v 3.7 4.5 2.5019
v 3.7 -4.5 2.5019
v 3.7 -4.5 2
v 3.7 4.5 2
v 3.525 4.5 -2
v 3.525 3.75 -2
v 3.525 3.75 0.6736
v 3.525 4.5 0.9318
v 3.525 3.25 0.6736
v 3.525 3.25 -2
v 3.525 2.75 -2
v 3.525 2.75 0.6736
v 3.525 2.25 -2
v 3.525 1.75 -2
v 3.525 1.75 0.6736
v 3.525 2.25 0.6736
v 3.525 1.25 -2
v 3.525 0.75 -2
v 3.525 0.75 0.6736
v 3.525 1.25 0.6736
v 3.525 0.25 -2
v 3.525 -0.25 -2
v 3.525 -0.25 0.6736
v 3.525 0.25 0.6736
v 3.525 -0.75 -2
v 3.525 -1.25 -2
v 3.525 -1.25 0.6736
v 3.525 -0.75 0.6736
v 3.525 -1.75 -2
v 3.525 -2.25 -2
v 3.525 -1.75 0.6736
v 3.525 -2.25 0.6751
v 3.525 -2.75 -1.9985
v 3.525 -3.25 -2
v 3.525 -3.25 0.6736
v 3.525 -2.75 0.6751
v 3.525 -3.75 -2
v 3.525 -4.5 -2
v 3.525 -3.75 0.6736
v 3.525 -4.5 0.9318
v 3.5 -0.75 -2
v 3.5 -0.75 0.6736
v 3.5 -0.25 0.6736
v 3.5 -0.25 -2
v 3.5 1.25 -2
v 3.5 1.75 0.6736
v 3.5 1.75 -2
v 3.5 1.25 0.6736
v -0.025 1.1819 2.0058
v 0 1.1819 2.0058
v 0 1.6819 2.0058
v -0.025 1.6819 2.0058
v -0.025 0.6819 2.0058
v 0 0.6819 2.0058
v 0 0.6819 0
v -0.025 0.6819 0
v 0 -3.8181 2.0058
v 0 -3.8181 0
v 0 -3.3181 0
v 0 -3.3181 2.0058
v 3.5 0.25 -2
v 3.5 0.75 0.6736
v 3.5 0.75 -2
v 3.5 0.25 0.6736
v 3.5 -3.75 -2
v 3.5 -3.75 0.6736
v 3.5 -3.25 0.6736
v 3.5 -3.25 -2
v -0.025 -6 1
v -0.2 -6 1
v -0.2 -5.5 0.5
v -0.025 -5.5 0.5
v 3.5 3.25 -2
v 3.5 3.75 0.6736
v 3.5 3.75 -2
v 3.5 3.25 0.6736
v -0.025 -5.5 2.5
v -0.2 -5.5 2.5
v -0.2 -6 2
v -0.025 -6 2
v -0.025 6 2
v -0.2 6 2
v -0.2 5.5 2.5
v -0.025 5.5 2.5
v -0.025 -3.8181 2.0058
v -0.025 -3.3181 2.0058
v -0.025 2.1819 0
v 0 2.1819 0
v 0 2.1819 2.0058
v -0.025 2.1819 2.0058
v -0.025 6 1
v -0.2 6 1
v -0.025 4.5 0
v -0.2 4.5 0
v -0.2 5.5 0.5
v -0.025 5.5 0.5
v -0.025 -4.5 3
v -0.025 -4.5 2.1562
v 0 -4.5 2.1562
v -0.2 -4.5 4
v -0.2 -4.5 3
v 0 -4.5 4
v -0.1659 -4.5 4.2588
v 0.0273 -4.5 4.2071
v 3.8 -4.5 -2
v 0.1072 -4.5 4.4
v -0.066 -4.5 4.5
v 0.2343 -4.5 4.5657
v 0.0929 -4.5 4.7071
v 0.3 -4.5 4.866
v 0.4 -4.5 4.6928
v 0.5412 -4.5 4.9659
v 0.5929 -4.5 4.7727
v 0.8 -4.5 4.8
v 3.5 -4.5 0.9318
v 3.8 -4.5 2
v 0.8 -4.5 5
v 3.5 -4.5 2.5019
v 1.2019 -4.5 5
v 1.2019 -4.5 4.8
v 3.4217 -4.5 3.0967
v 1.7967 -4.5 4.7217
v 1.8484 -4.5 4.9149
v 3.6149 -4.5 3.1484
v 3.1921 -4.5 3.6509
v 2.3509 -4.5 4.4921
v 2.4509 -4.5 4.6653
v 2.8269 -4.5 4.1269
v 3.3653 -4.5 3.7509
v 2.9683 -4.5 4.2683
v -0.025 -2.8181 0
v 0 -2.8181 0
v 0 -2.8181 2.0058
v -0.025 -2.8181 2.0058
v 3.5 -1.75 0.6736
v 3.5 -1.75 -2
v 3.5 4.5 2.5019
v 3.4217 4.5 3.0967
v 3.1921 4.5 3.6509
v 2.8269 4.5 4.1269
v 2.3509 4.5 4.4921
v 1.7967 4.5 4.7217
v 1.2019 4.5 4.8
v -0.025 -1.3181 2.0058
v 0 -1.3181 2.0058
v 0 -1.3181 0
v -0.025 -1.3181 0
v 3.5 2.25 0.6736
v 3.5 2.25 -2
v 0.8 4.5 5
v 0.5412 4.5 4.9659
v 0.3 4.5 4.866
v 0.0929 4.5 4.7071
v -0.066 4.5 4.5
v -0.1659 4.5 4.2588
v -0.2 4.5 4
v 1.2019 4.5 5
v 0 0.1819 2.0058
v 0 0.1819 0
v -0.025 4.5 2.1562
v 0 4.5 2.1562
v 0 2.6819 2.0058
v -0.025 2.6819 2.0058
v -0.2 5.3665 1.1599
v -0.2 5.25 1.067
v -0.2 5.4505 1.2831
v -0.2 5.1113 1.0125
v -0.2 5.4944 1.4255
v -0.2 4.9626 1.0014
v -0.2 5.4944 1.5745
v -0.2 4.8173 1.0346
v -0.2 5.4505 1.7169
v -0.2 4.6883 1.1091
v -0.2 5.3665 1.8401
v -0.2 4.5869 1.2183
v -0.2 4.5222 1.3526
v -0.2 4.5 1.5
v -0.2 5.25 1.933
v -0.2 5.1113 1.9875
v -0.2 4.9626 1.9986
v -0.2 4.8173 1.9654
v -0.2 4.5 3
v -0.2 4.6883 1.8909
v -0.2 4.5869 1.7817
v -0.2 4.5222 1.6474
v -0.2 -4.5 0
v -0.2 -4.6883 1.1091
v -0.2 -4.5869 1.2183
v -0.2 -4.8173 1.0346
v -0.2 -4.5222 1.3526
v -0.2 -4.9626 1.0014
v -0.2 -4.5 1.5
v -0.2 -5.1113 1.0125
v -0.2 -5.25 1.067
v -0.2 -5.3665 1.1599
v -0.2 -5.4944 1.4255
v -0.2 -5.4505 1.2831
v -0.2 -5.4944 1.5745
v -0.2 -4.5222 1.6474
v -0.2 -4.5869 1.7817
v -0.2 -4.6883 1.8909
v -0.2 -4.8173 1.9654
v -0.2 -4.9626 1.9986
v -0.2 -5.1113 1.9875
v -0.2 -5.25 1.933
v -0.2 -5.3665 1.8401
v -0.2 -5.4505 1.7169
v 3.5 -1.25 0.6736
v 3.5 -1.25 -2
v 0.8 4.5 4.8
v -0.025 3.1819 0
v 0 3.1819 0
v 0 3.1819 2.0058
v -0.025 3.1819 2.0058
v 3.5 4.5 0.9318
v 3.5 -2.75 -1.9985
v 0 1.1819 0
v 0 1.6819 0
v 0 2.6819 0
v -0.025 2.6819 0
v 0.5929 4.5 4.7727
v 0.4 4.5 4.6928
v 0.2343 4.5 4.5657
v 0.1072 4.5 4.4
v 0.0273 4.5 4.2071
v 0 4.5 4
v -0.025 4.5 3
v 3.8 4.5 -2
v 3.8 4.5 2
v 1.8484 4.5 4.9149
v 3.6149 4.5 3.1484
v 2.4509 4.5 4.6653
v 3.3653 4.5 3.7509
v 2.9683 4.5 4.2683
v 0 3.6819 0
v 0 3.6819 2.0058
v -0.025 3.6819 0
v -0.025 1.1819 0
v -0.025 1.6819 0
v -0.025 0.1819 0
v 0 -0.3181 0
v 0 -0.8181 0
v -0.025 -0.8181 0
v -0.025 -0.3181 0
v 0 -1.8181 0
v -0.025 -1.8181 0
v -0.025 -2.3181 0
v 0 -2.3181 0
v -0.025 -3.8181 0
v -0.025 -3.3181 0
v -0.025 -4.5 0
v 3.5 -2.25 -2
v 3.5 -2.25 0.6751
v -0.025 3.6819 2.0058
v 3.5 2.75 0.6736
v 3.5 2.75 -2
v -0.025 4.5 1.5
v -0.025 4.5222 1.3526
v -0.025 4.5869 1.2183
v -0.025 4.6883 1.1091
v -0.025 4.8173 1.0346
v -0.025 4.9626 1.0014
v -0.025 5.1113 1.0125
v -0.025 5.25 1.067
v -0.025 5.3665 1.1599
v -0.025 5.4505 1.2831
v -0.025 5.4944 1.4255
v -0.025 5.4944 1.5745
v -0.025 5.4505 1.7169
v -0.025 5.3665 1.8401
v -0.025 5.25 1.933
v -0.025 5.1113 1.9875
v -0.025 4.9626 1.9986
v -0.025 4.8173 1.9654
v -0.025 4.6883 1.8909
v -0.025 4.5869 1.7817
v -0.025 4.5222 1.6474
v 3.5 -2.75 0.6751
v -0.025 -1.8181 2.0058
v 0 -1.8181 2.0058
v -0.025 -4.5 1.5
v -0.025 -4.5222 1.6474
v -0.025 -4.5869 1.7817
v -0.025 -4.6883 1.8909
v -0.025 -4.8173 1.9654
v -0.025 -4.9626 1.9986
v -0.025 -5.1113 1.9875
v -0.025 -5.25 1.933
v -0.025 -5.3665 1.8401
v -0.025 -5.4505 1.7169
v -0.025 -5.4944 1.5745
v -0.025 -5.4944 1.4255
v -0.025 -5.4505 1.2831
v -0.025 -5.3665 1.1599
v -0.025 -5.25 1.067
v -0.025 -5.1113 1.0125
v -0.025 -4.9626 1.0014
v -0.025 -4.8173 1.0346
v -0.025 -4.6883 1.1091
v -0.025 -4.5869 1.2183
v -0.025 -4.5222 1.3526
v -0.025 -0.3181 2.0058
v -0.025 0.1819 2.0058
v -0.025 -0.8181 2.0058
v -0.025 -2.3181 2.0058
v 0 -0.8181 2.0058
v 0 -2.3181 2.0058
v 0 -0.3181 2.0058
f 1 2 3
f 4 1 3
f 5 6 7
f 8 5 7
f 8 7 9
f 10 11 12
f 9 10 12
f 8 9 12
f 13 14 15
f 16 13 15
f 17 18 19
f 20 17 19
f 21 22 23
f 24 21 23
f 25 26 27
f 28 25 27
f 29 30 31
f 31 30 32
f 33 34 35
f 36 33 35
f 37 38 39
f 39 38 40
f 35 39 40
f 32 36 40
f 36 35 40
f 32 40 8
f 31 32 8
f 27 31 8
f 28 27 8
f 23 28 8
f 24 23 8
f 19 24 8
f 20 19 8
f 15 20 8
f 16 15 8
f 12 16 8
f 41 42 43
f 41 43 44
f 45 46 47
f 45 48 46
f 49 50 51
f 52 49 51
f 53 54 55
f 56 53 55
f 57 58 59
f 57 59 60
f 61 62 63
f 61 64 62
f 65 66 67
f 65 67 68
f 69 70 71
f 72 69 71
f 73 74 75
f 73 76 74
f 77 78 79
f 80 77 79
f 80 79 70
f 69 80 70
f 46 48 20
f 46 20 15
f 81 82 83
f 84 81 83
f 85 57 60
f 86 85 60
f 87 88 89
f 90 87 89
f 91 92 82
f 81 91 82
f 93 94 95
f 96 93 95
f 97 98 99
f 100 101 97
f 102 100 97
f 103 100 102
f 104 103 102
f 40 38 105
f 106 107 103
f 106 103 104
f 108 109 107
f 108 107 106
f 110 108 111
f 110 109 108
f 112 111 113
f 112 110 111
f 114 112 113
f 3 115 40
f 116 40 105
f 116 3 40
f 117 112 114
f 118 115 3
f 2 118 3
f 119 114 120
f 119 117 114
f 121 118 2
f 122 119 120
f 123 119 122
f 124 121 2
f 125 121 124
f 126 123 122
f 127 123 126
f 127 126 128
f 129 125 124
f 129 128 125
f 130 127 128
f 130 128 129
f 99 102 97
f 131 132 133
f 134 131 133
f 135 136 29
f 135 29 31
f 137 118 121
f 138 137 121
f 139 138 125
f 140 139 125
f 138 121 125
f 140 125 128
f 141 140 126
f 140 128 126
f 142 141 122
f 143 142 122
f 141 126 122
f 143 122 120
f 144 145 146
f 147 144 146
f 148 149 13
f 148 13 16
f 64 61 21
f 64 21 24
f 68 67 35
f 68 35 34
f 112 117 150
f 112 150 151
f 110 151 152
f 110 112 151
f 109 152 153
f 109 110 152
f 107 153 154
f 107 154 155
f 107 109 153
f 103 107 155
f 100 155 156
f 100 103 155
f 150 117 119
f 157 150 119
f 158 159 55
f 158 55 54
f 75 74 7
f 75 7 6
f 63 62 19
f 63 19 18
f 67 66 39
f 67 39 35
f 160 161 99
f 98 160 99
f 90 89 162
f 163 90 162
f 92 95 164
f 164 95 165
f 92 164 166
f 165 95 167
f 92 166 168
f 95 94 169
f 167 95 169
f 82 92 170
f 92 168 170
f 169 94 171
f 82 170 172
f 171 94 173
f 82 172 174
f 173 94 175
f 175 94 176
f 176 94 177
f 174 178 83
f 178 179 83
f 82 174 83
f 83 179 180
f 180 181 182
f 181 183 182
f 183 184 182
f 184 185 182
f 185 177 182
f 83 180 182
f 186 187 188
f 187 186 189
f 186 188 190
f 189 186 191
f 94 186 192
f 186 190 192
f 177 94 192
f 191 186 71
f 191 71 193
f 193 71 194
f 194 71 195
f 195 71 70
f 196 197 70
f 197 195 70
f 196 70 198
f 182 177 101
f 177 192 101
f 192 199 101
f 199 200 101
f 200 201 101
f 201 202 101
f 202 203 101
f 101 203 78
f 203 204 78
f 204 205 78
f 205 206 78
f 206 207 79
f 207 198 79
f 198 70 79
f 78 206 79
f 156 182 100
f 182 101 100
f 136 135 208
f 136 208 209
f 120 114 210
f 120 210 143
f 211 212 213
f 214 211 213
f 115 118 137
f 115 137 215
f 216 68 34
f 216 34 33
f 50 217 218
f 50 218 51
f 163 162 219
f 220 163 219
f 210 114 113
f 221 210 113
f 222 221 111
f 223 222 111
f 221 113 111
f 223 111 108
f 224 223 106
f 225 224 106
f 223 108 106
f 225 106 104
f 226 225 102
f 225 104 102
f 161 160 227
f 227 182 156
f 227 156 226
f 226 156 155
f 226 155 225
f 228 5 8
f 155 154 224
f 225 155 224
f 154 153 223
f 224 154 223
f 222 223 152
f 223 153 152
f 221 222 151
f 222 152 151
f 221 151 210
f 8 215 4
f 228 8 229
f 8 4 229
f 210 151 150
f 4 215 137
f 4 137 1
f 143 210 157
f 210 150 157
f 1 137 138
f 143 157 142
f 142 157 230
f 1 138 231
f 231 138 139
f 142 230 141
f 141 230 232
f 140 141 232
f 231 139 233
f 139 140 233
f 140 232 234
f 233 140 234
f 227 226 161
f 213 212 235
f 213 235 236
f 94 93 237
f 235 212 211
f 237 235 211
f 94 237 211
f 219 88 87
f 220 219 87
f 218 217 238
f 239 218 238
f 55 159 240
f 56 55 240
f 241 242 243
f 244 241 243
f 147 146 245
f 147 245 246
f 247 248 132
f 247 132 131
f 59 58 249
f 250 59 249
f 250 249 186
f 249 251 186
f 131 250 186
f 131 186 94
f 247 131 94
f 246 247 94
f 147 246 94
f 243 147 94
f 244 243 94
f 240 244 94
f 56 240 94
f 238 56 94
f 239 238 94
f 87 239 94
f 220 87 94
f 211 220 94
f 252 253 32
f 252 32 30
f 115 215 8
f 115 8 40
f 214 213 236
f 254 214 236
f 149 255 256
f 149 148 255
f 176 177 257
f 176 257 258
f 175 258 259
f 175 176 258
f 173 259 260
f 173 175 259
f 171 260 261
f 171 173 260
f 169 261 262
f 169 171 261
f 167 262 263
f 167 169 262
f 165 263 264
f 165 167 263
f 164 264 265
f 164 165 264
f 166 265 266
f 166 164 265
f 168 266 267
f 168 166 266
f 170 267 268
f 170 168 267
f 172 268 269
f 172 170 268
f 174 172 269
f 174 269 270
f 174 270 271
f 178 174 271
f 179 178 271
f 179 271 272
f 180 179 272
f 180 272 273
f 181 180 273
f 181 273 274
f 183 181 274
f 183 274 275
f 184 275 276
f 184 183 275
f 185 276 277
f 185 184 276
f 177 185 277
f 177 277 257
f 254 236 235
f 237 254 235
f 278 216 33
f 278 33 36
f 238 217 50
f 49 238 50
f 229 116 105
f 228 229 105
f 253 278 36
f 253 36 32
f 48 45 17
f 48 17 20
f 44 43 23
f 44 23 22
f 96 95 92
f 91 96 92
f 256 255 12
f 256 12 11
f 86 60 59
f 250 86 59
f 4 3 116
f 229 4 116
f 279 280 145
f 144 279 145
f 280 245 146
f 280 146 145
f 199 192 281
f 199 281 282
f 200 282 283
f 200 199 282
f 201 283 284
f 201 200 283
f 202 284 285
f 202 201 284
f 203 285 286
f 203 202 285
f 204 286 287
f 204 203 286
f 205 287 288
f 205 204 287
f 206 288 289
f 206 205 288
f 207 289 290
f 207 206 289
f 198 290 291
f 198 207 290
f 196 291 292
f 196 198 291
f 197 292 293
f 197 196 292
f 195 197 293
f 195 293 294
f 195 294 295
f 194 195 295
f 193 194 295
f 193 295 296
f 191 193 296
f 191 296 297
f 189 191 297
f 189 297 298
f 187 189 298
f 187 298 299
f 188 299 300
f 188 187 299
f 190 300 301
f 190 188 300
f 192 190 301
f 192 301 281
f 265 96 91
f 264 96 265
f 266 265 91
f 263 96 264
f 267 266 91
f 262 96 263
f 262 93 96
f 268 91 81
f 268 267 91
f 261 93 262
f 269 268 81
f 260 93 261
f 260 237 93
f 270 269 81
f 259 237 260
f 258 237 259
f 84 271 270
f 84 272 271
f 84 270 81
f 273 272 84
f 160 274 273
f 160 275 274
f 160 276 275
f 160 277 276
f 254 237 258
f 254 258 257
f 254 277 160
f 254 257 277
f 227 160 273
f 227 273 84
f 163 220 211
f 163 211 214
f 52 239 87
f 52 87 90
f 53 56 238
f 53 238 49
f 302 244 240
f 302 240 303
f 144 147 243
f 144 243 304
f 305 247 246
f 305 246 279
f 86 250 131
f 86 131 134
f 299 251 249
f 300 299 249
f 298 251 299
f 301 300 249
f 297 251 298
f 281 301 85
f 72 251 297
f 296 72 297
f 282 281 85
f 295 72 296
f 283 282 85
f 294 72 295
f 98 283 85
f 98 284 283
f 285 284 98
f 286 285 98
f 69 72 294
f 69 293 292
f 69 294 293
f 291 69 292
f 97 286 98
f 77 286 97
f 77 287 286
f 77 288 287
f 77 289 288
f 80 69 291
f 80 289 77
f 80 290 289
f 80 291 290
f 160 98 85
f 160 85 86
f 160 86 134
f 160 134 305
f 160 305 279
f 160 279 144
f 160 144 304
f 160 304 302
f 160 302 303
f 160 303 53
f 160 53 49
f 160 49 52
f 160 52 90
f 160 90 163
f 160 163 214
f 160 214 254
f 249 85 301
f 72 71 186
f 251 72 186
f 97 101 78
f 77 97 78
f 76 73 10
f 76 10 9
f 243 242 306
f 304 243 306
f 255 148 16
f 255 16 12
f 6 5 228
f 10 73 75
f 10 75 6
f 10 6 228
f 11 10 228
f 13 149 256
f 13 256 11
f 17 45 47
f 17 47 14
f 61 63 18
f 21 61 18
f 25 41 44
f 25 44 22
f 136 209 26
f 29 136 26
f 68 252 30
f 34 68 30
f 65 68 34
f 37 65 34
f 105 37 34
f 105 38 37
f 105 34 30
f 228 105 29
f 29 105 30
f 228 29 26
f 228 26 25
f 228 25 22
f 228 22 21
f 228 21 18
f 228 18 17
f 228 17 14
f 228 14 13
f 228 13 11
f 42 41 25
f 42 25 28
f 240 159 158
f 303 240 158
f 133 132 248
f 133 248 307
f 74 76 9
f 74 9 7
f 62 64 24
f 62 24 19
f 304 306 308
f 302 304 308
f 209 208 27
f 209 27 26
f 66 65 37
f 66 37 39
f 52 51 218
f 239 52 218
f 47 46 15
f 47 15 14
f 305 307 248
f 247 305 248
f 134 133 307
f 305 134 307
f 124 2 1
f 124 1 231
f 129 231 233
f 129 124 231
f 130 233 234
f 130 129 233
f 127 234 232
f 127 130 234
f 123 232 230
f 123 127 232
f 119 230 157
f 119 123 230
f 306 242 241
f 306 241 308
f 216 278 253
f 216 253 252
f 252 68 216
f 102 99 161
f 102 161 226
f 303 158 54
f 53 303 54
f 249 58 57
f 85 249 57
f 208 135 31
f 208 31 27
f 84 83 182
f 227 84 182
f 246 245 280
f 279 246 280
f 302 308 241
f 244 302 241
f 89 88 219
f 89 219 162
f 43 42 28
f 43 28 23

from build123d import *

# Parameters (mm, degrees)
PAD_DEPTH       = 4.5
POCKET_DEPTH    = 0.025
POCKET001_DEPTH = 0.025
SKETCH003_R     = 0.5
PAD001_DEPTH    = 0.175


with BuildPart() as part:
    # Sketch → Pad (new body, symmetric)
    with BuildSketch(Plane.XZ):
        with BuildLine():
            Line((0, 0), (0, 4))
            ThreePointArc((0.8, 4.8), (0.234315, 4.565685), (0, 4))
            Line((0.8, 4.8), (1.201873, 4.8))
            ThreePointArc((3.5, 2.501873), (2.826894, 4.126894), (1.201873, 4.8))
            Line((3.5, 2.501873), (3.5, -2))
            Line((3.5, -2), (3.8, -2))
            Line((3.8, 2), (3.8, -2))
            Line((3.7, 2), (3.8, 2))
            Line((3.7, 2.501873), (3.7, 2))
            ThreePointArc((3.7, 2.501873), (2.968316, 4.268316), (1.201873, 5))
            Line((0.8, 5), (1.201873, 5))
            ThreePointArc((0.8, 5), (0.092893, 4.707107), (-0.2, 4))
            Line((-0.2, 0), (-0.2, 4))
            Line((0, 0), (-0.2, 0))
        make_face()
    extrude(amount=PAD_DEPTH, both=True)

    # Sketch001 (on Face1 of Pad) → Pocket (cut)
    with BuildSketch(Plane(origin=(0, 0, 0), x_dir=(0, 0, 1), z_dir=(1, 0, 0))):
        Polygon((0, 3.818103), (2.005794, 3.818103), (2.005794, 3.318103), (0, 3.318103), (0, 2.818103), (2.005794, 2.818103), (2.005794, 2.318103), (0, 2.318103), (0, 1.818103), (2.005794, 1.818103), (2.005794, 1.318103), (0, 1.318103), (0, 0.818103), (2.005794, 0.818103), (2.005794, 0.318103), (0, 0.318103), (0, -0.181897), (2.005794, -0.181897), (2.005794, -0.681897), (0, -0.681897), (0, -1.181897), (2.005794, -1.181897), (2.005794, -1.681897), (0, -1.681897), (0, -2.181897), (2.005794, -2.181897), (2.005794, -2.681897), (0, -2.681897), (0, -3.181897), (2.005794, -3.181897), (2.005794, -3.681897), (0, -3.681897), (0, -4.5), (2.156164, -4.5), (2.156164, 4.5), (0, 4.5), align=None)
    extrude(amount=-POCKET_DEPTH, mode=Mode.SUBTRACT)

    # Sketch002 (on Face16 of Pocket) → Pocket001 (cut)
    with BuildSketch(Plane(origin=(3.5, 0, 0), x_dir=(0, 0, -1), z_dir=(-1, 0, 0))):
        Polygon((2, 3.749999), (-0.673578, 3.749999), (-0.673578, 3.249999), (2, 3.249999), (1.998494, 2.750001), (-0.675084, 2.750001), (-0.675084, 2.250001), (2, 2.250001), (2, 1.750001), (-0.673578, 1.750001), (-0.673578, 1.250001), (2, 1.250001), (2, 0.750001), (-0.673578, 0.750001), (-0.673578, 0.250001), (2, 0.250001), (2, -0.249999), (-0.673578, -0.249999), (-0.673578, -0.749999), (2, -0.749999), (2, -1.249999), (-0.673578, -1.249999), (-0.673578, -1.749999), (2, -1.749999), (2, -2.249999), (-0.673578, -2.249999), (-0.673578, -2.749999), (2, -2.749999), (2, -3.249999), (-0.673578, -3.249999), (-0.673578, -3.749999), (2, -3.749999), (2, -4.5), (-0.931806, -4.5), (-0.931806, 4.5), (2, 4.5), align=None)
    extrude(amount=-POCKET001_DEPTH, mode=Mode.SUBTRACT)

    # Sketch003 (on Face8 of Pocket001) → Pad001 (join)
    with BuildSketch(Plane(origin=(-0.2, 0, 0), x_dir=(0, 0, -1), z_dir=(-1, 0, 0))):
        Polygon((0, -4.5), (-0.5, -5.5), (-1, -6), (-2, -6), (-2.5, -5.5), (-3, -4.5), align=None)
        with Locations((-1.5, -5)):
            Circle(SKETCH003_R, mode=Mode.SUBTRACT)
        Polygon((0, 4.5), (-3, 4.5), (-2.5, 5.5), (-2, 6), (-1, 6), (-0.5, 5.5), align=None)
        with Locations((-1.5, 5)):
            Circle(SKETCH003_R, mode=Mode.SUBTRACT)
    extrude(amount=-PAD001_DEPTH)


solid = part.part
